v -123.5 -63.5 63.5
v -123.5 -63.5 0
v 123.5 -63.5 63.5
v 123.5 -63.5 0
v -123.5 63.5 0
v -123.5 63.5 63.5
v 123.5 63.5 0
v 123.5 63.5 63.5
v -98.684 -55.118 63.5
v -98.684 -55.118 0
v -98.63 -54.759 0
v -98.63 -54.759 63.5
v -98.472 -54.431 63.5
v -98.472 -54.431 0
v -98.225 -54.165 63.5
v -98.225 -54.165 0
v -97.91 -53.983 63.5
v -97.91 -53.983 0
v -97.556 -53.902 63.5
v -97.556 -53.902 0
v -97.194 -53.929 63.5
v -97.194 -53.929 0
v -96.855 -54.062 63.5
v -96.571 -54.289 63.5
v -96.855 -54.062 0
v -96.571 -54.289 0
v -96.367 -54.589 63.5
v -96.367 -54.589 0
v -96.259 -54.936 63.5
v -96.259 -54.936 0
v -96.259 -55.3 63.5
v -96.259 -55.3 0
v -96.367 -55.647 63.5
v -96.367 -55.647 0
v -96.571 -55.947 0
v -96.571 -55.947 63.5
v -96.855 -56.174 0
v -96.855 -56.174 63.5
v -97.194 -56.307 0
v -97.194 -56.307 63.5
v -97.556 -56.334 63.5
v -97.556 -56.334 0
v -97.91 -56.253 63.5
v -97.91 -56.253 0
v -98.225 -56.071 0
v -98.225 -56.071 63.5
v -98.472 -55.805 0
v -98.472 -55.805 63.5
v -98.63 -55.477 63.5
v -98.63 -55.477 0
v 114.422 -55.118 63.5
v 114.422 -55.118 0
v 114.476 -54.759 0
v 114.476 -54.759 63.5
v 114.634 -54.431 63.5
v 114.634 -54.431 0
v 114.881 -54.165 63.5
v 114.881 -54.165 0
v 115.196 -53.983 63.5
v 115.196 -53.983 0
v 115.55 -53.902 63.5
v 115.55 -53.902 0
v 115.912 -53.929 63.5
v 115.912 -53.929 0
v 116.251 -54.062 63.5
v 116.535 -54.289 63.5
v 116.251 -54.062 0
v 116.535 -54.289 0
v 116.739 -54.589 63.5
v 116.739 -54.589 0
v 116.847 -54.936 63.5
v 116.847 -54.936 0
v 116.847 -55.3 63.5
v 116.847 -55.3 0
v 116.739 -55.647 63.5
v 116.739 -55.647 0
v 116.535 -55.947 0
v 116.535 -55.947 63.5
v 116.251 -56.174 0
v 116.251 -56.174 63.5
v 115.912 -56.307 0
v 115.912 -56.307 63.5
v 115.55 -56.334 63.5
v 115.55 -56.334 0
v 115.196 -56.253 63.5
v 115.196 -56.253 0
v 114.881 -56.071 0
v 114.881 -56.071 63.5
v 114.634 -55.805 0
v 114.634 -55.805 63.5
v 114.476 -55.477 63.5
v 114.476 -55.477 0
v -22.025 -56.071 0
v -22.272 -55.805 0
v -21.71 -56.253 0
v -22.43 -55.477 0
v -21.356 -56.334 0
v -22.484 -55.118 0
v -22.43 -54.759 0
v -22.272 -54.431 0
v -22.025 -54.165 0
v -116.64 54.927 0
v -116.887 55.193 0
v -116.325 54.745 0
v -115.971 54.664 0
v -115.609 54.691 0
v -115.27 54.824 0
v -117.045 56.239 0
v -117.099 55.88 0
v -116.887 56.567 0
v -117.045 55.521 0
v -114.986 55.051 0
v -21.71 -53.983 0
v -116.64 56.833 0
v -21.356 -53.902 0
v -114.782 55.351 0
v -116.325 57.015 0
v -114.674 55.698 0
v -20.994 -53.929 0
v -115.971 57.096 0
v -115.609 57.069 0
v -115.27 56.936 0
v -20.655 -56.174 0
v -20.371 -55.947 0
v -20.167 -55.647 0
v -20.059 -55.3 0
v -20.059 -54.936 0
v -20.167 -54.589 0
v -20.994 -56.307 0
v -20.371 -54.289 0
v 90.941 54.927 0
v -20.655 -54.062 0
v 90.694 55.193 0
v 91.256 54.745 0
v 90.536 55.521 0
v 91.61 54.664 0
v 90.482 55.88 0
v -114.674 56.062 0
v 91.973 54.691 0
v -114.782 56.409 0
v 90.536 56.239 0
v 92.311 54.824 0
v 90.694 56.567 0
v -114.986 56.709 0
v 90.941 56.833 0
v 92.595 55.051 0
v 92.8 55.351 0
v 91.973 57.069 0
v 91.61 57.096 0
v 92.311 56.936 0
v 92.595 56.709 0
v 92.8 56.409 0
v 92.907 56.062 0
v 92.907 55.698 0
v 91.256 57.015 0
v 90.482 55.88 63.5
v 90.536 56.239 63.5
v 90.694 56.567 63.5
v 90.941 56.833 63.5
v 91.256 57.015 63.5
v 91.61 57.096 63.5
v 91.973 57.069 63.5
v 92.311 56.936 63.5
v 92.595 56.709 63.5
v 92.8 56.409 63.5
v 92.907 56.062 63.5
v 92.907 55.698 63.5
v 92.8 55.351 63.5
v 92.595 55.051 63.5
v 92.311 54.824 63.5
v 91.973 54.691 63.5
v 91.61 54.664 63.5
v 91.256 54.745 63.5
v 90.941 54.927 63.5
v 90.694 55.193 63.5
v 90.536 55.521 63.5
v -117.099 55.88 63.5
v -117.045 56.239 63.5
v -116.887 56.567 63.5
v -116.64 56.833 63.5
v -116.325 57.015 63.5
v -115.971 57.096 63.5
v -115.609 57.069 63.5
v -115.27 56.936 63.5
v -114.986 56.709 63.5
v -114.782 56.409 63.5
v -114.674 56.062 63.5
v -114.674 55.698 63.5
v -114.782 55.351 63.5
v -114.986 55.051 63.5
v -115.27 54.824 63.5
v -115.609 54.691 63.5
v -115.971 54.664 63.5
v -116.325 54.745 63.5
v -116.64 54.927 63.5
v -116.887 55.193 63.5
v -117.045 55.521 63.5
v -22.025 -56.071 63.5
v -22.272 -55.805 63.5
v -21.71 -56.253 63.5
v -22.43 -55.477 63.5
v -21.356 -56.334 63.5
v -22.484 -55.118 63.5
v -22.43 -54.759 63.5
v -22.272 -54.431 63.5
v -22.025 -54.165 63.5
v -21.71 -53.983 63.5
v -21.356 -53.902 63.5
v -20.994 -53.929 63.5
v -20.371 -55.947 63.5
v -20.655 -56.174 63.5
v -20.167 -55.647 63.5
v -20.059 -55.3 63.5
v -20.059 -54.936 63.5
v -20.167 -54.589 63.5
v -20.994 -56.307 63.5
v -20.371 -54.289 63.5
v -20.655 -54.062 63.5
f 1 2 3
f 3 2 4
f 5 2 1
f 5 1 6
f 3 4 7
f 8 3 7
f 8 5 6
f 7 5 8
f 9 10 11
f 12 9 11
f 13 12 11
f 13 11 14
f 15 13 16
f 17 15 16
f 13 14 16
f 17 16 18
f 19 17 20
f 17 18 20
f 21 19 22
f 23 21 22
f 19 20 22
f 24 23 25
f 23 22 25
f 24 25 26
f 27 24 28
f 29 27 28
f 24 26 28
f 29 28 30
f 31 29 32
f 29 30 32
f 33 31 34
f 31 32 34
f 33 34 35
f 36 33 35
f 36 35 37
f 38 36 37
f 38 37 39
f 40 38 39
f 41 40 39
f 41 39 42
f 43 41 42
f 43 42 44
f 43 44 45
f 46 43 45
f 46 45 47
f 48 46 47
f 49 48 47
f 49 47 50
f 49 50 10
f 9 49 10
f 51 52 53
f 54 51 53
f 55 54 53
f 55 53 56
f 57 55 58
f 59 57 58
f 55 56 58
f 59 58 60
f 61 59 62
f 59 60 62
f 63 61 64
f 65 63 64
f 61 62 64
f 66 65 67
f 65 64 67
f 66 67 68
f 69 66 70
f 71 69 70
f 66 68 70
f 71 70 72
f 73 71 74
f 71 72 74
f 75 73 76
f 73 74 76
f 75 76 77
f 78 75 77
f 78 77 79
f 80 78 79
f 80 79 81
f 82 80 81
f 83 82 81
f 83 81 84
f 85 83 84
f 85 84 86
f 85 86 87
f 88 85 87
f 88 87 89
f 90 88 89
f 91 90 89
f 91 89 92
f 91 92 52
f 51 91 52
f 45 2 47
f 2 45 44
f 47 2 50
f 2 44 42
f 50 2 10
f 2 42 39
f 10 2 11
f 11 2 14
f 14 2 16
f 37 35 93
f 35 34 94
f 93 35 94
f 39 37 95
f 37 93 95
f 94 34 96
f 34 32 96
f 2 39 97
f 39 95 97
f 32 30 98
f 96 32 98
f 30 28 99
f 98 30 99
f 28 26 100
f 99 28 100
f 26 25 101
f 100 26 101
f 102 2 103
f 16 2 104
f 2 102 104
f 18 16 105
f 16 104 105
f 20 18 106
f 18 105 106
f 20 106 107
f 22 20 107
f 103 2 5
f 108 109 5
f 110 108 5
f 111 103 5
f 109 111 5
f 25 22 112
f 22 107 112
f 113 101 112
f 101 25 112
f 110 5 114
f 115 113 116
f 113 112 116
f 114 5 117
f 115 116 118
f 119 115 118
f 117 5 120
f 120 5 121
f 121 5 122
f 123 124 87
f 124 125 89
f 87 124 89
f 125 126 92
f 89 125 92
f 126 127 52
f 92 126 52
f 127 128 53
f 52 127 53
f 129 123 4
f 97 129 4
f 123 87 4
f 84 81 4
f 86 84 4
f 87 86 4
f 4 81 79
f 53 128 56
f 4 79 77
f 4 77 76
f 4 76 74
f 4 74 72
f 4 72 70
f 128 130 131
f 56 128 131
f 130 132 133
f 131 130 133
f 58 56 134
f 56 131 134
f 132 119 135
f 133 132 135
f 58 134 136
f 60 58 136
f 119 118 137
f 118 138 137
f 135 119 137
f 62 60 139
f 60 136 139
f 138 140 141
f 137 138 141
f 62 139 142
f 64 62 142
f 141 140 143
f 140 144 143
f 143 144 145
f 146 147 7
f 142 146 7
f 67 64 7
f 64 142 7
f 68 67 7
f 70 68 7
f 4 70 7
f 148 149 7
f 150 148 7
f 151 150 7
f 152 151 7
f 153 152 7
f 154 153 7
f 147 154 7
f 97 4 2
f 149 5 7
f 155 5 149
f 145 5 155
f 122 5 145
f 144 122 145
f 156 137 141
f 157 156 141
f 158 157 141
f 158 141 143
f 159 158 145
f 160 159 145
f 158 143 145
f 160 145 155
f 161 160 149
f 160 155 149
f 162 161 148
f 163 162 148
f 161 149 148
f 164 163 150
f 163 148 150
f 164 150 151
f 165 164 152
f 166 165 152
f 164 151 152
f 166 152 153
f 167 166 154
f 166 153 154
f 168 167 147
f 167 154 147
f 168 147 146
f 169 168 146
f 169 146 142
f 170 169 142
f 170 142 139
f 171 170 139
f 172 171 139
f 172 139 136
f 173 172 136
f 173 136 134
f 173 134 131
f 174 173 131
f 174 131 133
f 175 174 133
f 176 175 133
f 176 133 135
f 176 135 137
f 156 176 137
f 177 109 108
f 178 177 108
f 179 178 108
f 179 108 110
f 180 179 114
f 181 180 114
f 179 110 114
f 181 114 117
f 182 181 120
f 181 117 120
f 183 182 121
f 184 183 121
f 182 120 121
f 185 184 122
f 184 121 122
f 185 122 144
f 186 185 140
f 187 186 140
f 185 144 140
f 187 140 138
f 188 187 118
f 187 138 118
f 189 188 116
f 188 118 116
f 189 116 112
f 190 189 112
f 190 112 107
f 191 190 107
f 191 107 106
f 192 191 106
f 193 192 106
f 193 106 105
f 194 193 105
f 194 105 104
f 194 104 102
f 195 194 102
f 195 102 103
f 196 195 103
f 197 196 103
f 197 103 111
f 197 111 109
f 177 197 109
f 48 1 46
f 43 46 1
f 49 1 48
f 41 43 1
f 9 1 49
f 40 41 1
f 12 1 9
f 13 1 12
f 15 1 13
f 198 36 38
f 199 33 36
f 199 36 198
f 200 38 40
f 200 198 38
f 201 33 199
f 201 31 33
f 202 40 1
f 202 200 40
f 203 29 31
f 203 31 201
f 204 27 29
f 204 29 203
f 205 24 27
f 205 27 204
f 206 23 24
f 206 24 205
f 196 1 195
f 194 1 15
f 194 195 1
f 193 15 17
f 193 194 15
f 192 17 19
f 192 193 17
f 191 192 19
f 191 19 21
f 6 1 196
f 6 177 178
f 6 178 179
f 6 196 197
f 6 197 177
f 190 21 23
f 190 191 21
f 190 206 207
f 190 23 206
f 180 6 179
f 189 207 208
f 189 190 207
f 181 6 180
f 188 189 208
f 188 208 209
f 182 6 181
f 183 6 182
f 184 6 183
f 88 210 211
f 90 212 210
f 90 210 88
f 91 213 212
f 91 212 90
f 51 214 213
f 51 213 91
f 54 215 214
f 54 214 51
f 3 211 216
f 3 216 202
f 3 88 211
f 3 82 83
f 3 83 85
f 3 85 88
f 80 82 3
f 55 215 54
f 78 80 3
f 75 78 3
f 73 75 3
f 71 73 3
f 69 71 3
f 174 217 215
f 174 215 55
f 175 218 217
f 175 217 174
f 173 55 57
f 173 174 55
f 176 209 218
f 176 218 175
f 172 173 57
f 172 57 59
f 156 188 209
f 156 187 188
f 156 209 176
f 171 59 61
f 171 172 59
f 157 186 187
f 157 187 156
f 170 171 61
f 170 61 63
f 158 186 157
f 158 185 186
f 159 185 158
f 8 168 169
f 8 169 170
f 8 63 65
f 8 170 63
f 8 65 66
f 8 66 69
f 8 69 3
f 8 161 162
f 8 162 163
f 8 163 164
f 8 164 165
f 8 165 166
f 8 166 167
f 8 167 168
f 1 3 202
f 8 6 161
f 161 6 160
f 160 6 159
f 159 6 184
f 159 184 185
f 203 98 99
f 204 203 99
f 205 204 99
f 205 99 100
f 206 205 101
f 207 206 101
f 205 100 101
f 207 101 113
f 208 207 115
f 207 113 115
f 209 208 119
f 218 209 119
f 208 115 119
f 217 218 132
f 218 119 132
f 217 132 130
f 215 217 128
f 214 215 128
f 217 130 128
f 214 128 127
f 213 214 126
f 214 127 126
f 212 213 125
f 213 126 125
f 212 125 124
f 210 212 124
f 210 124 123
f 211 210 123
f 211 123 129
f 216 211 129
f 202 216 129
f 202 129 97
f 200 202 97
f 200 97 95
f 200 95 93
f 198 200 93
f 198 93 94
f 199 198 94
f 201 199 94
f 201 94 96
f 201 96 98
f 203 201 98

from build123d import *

# Parameters (mm, degrees)
SKETCH1_W                   = 247
SKETCH1_H                   = 127
BOSS_EXTRUDE1_DEPTH         = 63.5
F_41_0_096_DIAMETER_HOLE1_D = 2.4384


with BuildPart() as part:
    # Sketch1 → Boss-Extrude1 (new body)
    with BuildSketch(Plane.XY):
        Rectangle(SKETCH1_W, SKETCH1_H)
    extrude(amount=BOSS_EXTRUDE1_DEPTH)

    # #41 (0.096) Diameter Hole1 (through all)
    with Locations(Plane.XY.offset(63.5)):
        with Locations((-115.88, 55.88), (-97.465, -55.118), (-21.265, -55.118), (115.641, -55.118), (91.7015, 55.88)):
            Hole(F_41_0_096_DIAMETER_HOLE1_D / 2)


solid = part.part
